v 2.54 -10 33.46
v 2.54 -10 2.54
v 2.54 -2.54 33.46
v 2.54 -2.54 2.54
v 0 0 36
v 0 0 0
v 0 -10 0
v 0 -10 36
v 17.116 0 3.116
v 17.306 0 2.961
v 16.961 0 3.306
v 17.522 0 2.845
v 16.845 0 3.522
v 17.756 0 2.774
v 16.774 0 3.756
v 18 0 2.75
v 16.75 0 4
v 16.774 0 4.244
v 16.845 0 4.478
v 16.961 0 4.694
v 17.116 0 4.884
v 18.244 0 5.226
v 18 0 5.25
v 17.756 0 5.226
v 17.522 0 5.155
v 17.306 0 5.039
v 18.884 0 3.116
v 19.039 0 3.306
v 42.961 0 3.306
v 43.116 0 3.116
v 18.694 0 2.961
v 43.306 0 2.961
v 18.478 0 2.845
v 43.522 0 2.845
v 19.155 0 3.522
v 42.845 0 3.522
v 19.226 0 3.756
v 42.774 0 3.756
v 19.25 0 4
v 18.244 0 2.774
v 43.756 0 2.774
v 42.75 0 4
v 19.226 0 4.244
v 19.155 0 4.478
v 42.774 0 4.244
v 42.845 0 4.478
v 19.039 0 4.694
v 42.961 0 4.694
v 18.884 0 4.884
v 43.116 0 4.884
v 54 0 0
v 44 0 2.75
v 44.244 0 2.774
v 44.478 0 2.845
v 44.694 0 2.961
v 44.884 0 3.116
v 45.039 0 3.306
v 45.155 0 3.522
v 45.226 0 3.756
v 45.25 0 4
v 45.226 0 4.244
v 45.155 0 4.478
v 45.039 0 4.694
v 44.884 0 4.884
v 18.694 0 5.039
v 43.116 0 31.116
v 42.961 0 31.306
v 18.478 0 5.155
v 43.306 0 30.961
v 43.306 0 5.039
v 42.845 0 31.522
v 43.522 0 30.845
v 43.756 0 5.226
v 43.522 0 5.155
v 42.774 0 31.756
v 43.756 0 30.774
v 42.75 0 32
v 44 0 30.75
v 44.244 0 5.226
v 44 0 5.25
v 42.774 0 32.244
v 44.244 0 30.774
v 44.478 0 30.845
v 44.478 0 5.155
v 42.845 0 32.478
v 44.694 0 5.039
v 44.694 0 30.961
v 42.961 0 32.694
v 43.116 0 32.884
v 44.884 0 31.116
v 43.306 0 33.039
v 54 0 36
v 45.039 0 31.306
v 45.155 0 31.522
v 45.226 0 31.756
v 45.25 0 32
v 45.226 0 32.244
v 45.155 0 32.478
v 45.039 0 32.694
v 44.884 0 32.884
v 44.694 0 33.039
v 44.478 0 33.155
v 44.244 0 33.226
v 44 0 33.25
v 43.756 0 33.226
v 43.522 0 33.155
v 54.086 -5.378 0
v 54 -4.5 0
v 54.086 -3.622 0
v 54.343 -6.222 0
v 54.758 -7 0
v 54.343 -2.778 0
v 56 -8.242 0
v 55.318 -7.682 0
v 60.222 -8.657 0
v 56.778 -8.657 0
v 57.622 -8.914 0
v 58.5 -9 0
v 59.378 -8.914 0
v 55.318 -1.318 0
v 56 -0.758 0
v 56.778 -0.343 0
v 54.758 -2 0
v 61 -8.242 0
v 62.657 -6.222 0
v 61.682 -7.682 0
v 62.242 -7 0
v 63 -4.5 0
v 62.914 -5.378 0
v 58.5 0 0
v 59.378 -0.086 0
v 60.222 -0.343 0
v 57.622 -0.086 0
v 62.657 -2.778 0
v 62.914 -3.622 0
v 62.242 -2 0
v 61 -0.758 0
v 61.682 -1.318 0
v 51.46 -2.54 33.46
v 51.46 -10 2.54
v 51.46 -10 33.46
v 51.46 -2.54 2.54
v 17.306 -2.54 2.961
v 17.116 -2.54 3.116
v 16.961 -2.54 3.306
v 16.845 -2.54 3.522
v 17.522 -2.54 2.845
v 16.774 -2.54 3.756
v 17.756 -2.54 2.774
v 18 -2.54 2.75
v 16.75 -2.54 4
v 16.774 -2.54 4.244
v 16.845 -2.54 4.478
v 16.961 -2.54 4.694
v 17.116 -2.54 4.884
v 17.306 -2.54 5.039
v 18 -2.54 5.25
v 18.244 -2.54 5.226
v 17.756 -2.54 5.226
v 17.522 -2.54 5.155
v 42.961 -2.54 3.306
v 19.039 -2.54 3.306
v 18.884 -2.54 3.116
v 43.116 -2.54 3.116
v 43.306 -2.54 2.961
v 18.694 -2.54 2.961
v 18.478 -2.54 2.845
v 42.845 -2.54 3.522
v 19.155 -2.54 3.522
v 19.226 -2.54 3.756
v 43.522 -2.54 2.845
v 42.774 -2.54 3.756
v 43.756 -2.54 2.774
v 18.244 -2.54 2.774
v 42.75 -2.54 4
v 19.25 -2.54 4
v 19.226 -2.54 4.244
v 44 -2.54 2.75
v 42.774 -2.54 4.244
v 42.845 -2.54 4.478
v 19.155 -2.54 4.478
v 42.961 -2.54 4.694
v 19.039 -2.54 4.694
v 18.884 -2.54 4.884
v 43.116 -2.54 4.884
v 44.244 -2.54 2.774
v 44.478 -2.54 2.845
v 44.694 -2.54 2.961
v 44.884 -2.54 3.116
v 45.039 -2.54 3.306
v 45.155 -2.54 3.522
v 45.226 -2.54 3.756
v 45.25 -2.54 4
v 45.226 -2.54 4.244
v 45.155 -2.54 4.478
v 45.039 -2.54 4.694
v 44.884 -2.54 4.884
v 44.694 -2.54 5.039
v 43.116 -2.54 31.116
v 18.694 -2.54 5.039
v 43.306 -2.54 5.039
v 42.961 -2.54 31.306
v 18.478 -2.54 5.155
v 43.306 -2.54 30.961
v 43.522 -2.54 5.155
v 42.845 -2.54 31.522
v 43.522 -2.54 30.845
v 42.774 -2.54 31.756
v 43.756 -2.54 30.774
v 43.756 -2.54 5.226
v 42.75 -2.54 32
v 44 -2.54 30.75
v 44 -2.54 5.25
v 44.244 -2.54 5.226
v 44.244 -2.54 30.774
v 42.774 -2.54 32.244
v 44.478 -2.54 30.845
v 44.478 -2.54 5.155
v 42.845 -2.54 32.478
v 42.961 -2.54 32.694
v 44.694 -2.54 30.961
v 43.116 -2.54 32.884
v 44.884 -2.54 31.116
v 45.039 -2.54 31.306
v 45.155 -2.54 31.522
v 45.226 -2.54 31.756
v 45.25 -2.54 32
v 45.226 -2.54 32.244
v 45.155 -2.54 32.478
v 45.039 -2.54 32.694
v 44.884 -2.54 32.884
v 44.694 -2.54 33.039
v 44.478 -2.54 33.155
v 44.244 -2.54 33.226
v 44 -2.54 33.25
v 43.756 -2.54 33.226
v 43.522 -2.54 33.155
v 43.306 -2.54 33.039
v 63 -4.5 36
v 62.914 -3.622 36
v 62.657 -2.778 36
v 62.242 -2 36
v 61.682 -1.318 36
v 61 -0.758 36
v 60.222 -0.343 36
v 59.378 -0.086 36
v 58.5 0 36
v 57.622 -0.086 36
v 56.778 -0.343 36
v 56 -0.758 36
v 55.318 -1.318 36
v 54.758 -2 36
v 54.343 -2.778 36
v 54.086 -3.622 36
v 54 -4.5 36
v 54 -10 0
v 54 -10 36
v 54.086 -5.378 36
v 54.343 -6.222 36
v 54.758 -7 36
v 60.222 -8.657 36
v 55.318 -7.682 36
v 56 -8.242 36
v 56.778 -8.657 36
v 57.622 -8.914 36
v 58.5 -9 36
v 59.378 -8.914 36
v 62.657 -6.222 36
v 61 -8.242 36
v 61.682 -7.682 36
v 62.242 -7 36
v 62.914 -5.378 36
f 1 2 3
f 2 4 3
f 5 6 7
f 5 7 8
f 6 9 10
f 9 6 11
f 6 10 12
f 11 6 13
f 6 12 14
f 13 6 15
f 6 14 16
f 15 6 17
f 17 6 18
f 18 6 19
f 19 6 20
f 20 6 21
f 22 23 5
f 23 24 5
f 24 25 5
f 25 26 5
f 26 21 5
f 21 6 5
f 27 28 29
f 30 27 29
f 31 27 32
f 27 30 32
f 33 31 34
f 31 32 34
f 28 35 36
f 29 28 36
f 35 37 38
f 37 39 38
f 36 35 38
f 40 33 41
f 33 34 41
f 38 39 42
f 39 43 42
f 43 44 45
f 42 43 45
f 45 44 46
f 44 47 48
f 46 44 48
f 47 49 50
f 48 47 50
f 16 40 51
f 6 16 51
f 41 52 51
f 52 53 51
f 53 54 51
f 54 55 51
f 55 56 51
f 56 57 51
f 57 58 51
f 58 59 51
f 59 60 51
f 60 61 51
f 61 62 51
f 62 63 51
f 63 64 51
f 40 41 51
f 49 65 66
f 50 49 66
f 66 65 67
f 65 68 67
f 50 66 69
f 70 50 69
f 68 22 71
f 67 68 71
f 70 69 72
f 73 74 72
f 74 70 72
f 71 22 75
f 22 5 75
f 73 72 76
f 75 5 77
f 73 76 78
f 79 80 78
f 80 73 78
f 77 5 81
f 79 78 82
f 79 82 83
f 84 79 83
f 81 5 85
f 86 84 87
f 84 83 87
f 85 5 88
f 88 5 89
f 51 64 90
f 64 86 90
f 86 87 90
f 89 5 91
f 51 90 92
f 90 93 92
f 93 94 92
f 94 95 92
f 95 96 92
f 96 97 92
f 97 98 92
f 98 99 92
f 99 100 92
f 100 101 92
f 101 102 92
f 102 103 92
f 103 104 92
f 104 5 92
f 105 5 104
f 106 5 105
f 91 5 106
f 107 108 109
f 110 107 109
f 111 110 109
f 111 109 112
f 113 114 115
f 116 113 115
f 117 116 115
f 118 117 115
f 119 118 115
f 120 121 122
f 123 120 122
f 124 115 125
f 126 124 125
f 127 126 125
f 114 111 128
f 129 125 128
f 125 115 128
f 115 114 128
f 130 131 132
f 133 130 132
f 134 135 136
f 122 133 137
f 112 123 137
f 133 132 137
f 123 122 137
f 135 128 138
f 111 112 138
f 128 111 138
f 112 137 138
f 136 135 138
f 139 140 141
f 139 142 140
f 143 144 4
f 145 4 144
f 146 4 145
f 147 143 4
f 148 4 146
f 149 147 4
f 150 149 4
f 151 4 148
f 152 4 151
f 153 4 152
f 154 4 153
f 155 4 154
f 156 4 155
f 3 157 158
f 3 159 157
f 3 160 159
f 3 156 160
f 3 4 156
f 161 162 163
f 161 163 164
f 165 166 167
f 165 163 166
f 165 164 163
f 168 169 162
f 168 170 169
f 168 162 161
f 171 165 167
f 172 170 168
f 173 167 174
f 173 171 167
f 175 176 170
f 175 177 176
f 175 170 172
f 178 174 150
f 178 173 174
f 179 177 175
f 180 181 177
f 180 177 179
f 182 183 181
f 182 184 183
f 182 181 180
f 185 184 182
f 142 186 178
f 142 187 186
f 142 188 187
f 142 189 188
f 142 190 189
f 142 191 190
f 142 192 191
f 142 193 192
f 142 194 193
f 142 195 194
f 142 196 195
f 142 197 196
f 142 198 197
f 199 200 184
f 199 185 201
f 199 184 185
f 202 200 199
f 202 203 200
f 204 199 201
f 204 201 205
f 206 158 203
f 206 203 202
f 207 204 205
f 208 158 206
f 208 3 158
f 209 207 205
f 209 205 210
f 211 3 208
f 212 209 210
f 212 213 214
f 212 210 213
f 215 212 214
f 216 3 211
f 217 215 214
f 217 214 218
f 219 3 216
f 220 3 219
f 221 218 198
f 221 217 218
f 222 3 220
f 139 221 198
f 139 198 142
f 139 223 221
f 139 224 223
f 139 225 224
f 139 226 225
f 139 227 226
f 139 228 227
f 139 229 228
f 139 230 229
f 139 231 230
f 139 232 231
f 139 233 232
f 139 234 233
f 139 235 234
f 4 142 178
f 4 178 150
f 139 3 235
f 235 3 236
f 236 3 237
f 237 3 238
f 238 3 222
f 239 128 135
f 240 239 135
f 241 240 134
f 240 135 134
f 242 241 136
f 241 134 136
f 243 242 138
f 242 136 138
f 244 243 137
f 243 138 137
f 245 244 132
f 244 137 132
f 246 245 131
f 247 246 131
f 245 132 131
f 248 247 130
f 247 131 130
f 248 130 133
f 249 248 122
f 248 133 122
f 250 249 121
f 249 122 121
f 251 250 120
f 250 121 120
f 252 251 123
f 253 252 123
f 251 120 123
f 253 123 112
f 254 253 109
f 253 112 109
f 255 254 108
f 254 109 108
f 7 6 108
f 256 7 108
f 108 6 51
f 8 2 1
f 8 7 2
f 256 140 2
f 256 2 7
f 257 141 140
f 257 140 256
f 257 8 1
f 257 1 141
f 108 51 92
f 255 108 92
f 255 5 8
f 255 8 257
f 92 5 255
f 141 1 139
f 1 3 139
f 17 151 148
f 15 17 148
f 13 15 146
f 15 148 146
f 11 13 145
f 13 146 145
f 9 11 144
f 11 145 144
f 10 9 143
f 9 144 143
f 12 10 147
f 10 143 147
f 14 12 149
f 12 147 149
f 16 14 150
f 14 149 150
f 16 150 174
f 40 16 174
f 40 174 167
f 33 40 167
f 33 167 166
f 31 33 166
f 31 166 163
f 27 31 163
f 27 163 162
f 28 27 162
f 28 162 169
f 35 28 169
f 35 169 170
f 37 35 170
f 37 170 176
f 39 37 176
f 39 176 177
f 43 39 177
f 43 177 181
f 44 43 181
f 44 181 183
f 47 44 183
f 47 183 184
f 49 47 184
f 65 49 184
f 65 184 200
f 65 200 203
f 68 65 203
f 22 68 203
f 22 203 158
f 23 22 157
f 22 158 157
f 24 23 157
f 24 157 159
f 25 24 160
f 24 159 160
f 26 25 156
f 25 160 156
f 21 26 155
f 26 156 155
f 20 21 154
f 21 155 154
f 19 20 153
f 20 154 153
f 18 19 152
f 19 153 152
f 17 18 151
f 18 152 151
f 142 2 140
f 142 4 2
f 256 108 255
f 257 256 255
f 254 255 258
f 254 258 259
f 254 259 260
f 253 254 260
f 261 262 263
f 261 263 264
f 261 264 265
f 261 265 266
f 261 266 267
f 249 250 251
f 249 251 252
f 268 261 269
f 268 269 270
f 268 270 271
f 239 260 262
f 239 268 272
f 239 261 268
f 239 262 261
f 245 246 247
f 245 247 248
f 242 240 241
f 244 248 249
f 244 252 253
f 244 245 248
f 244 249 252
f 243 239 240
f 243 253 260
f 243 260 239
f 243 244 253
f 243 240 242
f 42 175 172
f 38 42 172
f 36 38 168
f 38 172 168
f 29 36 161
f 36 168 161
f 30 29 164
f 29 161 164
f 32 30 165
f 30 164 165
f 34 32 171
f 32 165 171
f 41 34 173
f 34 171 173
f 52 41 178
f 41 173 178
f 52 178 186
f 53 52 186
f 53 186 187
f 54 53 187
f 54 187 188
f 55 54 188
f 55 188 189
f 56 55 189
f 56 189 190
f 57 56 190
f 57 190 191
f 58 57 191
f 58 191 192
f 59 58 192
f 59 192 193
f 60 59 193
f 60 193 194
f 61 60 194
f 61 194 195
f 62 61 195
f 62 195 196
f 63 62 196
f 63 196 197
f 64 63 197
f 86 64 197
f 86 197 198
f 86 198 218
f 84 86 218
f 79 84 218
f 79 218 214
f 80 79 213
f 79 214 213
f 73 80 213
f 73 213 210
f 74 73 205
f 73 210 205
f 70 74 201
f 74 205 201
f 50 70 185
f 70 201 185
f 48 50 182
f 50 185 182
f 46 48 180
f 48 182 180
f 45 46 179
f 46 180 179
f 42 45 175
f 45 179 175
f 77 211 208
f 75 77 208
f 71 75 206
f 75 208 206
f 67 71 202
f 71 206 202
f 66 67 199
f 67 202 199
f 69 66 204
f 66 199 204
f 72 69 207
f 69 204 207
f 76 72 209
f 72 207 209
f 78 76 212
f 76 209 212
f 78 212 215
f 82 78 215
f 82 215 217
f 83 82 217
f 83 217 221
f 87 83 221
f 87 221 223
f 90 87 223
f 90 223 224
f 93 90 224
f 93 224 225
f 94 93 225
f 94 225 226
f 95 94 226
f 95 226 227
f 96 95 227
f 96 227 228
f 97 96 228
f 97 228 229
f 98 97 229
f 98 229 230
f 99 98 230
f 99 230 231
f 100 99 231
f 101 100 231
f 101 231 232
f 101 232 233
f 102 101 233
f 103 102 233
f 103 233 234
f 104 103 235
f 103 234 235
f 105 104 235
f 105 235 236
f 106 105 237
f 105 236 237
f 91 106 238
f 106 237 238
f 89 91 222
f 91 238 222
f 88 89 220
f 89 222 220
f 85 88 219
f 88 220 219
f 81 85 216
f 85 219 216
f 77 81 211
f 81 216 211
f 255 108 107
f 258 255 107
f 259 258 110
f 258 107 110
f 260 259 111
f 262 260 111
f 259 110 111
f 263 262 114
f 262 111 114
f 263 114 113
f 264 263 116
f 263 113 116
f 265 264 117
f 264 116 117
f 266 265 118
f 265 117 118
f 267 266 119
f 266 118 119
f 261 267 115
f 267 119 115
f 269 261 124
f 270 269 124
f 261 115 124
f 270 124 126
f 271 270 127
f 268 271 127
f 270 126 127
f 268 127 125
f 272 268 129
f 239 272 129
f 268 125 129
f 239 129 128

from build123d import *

# Parameters (mm, degrees)
F1_W     = 54
F1_H     = 36
F2_DEPTH = 10
F3_T     = -2.54
F4_D     = 2.5
F5_R     = 4.5
F6_DEPTH = 36


with BuildPart() as f2:
    # F1 (on Front) → F2 (new body)
    with BuildSketch(Plane.XZ):
        with Locations((27, 18)):
            Rectangle(F1_W, F1_H)
    extrude(amount=F2_DEPTH)

    # F3
    f3_openings = [f2.faces().sort_by_distance(p)[0] for p in [
        (27, -10, 18),
    ]]
    offset(amount=F3_T, openings=f3_openings)

    # F4 (through all)
    with Locations(Plane(origin=(0, 0, 0), x_dir=(1, 0, 0), z_dir=(0, 1, 0))):
        with Locations((44, -4), (44, -32), (18, -4)):
            Hole(F4_D / 2)

    # F5 (on Top) → F6 (join, through all)
    with BuildSketch(Plane.XY):
        with Locations((58.5, -4.5)):
            Circle(F5_R)
    extrude(amount=F6_DEPTH)


solid = f2.part
